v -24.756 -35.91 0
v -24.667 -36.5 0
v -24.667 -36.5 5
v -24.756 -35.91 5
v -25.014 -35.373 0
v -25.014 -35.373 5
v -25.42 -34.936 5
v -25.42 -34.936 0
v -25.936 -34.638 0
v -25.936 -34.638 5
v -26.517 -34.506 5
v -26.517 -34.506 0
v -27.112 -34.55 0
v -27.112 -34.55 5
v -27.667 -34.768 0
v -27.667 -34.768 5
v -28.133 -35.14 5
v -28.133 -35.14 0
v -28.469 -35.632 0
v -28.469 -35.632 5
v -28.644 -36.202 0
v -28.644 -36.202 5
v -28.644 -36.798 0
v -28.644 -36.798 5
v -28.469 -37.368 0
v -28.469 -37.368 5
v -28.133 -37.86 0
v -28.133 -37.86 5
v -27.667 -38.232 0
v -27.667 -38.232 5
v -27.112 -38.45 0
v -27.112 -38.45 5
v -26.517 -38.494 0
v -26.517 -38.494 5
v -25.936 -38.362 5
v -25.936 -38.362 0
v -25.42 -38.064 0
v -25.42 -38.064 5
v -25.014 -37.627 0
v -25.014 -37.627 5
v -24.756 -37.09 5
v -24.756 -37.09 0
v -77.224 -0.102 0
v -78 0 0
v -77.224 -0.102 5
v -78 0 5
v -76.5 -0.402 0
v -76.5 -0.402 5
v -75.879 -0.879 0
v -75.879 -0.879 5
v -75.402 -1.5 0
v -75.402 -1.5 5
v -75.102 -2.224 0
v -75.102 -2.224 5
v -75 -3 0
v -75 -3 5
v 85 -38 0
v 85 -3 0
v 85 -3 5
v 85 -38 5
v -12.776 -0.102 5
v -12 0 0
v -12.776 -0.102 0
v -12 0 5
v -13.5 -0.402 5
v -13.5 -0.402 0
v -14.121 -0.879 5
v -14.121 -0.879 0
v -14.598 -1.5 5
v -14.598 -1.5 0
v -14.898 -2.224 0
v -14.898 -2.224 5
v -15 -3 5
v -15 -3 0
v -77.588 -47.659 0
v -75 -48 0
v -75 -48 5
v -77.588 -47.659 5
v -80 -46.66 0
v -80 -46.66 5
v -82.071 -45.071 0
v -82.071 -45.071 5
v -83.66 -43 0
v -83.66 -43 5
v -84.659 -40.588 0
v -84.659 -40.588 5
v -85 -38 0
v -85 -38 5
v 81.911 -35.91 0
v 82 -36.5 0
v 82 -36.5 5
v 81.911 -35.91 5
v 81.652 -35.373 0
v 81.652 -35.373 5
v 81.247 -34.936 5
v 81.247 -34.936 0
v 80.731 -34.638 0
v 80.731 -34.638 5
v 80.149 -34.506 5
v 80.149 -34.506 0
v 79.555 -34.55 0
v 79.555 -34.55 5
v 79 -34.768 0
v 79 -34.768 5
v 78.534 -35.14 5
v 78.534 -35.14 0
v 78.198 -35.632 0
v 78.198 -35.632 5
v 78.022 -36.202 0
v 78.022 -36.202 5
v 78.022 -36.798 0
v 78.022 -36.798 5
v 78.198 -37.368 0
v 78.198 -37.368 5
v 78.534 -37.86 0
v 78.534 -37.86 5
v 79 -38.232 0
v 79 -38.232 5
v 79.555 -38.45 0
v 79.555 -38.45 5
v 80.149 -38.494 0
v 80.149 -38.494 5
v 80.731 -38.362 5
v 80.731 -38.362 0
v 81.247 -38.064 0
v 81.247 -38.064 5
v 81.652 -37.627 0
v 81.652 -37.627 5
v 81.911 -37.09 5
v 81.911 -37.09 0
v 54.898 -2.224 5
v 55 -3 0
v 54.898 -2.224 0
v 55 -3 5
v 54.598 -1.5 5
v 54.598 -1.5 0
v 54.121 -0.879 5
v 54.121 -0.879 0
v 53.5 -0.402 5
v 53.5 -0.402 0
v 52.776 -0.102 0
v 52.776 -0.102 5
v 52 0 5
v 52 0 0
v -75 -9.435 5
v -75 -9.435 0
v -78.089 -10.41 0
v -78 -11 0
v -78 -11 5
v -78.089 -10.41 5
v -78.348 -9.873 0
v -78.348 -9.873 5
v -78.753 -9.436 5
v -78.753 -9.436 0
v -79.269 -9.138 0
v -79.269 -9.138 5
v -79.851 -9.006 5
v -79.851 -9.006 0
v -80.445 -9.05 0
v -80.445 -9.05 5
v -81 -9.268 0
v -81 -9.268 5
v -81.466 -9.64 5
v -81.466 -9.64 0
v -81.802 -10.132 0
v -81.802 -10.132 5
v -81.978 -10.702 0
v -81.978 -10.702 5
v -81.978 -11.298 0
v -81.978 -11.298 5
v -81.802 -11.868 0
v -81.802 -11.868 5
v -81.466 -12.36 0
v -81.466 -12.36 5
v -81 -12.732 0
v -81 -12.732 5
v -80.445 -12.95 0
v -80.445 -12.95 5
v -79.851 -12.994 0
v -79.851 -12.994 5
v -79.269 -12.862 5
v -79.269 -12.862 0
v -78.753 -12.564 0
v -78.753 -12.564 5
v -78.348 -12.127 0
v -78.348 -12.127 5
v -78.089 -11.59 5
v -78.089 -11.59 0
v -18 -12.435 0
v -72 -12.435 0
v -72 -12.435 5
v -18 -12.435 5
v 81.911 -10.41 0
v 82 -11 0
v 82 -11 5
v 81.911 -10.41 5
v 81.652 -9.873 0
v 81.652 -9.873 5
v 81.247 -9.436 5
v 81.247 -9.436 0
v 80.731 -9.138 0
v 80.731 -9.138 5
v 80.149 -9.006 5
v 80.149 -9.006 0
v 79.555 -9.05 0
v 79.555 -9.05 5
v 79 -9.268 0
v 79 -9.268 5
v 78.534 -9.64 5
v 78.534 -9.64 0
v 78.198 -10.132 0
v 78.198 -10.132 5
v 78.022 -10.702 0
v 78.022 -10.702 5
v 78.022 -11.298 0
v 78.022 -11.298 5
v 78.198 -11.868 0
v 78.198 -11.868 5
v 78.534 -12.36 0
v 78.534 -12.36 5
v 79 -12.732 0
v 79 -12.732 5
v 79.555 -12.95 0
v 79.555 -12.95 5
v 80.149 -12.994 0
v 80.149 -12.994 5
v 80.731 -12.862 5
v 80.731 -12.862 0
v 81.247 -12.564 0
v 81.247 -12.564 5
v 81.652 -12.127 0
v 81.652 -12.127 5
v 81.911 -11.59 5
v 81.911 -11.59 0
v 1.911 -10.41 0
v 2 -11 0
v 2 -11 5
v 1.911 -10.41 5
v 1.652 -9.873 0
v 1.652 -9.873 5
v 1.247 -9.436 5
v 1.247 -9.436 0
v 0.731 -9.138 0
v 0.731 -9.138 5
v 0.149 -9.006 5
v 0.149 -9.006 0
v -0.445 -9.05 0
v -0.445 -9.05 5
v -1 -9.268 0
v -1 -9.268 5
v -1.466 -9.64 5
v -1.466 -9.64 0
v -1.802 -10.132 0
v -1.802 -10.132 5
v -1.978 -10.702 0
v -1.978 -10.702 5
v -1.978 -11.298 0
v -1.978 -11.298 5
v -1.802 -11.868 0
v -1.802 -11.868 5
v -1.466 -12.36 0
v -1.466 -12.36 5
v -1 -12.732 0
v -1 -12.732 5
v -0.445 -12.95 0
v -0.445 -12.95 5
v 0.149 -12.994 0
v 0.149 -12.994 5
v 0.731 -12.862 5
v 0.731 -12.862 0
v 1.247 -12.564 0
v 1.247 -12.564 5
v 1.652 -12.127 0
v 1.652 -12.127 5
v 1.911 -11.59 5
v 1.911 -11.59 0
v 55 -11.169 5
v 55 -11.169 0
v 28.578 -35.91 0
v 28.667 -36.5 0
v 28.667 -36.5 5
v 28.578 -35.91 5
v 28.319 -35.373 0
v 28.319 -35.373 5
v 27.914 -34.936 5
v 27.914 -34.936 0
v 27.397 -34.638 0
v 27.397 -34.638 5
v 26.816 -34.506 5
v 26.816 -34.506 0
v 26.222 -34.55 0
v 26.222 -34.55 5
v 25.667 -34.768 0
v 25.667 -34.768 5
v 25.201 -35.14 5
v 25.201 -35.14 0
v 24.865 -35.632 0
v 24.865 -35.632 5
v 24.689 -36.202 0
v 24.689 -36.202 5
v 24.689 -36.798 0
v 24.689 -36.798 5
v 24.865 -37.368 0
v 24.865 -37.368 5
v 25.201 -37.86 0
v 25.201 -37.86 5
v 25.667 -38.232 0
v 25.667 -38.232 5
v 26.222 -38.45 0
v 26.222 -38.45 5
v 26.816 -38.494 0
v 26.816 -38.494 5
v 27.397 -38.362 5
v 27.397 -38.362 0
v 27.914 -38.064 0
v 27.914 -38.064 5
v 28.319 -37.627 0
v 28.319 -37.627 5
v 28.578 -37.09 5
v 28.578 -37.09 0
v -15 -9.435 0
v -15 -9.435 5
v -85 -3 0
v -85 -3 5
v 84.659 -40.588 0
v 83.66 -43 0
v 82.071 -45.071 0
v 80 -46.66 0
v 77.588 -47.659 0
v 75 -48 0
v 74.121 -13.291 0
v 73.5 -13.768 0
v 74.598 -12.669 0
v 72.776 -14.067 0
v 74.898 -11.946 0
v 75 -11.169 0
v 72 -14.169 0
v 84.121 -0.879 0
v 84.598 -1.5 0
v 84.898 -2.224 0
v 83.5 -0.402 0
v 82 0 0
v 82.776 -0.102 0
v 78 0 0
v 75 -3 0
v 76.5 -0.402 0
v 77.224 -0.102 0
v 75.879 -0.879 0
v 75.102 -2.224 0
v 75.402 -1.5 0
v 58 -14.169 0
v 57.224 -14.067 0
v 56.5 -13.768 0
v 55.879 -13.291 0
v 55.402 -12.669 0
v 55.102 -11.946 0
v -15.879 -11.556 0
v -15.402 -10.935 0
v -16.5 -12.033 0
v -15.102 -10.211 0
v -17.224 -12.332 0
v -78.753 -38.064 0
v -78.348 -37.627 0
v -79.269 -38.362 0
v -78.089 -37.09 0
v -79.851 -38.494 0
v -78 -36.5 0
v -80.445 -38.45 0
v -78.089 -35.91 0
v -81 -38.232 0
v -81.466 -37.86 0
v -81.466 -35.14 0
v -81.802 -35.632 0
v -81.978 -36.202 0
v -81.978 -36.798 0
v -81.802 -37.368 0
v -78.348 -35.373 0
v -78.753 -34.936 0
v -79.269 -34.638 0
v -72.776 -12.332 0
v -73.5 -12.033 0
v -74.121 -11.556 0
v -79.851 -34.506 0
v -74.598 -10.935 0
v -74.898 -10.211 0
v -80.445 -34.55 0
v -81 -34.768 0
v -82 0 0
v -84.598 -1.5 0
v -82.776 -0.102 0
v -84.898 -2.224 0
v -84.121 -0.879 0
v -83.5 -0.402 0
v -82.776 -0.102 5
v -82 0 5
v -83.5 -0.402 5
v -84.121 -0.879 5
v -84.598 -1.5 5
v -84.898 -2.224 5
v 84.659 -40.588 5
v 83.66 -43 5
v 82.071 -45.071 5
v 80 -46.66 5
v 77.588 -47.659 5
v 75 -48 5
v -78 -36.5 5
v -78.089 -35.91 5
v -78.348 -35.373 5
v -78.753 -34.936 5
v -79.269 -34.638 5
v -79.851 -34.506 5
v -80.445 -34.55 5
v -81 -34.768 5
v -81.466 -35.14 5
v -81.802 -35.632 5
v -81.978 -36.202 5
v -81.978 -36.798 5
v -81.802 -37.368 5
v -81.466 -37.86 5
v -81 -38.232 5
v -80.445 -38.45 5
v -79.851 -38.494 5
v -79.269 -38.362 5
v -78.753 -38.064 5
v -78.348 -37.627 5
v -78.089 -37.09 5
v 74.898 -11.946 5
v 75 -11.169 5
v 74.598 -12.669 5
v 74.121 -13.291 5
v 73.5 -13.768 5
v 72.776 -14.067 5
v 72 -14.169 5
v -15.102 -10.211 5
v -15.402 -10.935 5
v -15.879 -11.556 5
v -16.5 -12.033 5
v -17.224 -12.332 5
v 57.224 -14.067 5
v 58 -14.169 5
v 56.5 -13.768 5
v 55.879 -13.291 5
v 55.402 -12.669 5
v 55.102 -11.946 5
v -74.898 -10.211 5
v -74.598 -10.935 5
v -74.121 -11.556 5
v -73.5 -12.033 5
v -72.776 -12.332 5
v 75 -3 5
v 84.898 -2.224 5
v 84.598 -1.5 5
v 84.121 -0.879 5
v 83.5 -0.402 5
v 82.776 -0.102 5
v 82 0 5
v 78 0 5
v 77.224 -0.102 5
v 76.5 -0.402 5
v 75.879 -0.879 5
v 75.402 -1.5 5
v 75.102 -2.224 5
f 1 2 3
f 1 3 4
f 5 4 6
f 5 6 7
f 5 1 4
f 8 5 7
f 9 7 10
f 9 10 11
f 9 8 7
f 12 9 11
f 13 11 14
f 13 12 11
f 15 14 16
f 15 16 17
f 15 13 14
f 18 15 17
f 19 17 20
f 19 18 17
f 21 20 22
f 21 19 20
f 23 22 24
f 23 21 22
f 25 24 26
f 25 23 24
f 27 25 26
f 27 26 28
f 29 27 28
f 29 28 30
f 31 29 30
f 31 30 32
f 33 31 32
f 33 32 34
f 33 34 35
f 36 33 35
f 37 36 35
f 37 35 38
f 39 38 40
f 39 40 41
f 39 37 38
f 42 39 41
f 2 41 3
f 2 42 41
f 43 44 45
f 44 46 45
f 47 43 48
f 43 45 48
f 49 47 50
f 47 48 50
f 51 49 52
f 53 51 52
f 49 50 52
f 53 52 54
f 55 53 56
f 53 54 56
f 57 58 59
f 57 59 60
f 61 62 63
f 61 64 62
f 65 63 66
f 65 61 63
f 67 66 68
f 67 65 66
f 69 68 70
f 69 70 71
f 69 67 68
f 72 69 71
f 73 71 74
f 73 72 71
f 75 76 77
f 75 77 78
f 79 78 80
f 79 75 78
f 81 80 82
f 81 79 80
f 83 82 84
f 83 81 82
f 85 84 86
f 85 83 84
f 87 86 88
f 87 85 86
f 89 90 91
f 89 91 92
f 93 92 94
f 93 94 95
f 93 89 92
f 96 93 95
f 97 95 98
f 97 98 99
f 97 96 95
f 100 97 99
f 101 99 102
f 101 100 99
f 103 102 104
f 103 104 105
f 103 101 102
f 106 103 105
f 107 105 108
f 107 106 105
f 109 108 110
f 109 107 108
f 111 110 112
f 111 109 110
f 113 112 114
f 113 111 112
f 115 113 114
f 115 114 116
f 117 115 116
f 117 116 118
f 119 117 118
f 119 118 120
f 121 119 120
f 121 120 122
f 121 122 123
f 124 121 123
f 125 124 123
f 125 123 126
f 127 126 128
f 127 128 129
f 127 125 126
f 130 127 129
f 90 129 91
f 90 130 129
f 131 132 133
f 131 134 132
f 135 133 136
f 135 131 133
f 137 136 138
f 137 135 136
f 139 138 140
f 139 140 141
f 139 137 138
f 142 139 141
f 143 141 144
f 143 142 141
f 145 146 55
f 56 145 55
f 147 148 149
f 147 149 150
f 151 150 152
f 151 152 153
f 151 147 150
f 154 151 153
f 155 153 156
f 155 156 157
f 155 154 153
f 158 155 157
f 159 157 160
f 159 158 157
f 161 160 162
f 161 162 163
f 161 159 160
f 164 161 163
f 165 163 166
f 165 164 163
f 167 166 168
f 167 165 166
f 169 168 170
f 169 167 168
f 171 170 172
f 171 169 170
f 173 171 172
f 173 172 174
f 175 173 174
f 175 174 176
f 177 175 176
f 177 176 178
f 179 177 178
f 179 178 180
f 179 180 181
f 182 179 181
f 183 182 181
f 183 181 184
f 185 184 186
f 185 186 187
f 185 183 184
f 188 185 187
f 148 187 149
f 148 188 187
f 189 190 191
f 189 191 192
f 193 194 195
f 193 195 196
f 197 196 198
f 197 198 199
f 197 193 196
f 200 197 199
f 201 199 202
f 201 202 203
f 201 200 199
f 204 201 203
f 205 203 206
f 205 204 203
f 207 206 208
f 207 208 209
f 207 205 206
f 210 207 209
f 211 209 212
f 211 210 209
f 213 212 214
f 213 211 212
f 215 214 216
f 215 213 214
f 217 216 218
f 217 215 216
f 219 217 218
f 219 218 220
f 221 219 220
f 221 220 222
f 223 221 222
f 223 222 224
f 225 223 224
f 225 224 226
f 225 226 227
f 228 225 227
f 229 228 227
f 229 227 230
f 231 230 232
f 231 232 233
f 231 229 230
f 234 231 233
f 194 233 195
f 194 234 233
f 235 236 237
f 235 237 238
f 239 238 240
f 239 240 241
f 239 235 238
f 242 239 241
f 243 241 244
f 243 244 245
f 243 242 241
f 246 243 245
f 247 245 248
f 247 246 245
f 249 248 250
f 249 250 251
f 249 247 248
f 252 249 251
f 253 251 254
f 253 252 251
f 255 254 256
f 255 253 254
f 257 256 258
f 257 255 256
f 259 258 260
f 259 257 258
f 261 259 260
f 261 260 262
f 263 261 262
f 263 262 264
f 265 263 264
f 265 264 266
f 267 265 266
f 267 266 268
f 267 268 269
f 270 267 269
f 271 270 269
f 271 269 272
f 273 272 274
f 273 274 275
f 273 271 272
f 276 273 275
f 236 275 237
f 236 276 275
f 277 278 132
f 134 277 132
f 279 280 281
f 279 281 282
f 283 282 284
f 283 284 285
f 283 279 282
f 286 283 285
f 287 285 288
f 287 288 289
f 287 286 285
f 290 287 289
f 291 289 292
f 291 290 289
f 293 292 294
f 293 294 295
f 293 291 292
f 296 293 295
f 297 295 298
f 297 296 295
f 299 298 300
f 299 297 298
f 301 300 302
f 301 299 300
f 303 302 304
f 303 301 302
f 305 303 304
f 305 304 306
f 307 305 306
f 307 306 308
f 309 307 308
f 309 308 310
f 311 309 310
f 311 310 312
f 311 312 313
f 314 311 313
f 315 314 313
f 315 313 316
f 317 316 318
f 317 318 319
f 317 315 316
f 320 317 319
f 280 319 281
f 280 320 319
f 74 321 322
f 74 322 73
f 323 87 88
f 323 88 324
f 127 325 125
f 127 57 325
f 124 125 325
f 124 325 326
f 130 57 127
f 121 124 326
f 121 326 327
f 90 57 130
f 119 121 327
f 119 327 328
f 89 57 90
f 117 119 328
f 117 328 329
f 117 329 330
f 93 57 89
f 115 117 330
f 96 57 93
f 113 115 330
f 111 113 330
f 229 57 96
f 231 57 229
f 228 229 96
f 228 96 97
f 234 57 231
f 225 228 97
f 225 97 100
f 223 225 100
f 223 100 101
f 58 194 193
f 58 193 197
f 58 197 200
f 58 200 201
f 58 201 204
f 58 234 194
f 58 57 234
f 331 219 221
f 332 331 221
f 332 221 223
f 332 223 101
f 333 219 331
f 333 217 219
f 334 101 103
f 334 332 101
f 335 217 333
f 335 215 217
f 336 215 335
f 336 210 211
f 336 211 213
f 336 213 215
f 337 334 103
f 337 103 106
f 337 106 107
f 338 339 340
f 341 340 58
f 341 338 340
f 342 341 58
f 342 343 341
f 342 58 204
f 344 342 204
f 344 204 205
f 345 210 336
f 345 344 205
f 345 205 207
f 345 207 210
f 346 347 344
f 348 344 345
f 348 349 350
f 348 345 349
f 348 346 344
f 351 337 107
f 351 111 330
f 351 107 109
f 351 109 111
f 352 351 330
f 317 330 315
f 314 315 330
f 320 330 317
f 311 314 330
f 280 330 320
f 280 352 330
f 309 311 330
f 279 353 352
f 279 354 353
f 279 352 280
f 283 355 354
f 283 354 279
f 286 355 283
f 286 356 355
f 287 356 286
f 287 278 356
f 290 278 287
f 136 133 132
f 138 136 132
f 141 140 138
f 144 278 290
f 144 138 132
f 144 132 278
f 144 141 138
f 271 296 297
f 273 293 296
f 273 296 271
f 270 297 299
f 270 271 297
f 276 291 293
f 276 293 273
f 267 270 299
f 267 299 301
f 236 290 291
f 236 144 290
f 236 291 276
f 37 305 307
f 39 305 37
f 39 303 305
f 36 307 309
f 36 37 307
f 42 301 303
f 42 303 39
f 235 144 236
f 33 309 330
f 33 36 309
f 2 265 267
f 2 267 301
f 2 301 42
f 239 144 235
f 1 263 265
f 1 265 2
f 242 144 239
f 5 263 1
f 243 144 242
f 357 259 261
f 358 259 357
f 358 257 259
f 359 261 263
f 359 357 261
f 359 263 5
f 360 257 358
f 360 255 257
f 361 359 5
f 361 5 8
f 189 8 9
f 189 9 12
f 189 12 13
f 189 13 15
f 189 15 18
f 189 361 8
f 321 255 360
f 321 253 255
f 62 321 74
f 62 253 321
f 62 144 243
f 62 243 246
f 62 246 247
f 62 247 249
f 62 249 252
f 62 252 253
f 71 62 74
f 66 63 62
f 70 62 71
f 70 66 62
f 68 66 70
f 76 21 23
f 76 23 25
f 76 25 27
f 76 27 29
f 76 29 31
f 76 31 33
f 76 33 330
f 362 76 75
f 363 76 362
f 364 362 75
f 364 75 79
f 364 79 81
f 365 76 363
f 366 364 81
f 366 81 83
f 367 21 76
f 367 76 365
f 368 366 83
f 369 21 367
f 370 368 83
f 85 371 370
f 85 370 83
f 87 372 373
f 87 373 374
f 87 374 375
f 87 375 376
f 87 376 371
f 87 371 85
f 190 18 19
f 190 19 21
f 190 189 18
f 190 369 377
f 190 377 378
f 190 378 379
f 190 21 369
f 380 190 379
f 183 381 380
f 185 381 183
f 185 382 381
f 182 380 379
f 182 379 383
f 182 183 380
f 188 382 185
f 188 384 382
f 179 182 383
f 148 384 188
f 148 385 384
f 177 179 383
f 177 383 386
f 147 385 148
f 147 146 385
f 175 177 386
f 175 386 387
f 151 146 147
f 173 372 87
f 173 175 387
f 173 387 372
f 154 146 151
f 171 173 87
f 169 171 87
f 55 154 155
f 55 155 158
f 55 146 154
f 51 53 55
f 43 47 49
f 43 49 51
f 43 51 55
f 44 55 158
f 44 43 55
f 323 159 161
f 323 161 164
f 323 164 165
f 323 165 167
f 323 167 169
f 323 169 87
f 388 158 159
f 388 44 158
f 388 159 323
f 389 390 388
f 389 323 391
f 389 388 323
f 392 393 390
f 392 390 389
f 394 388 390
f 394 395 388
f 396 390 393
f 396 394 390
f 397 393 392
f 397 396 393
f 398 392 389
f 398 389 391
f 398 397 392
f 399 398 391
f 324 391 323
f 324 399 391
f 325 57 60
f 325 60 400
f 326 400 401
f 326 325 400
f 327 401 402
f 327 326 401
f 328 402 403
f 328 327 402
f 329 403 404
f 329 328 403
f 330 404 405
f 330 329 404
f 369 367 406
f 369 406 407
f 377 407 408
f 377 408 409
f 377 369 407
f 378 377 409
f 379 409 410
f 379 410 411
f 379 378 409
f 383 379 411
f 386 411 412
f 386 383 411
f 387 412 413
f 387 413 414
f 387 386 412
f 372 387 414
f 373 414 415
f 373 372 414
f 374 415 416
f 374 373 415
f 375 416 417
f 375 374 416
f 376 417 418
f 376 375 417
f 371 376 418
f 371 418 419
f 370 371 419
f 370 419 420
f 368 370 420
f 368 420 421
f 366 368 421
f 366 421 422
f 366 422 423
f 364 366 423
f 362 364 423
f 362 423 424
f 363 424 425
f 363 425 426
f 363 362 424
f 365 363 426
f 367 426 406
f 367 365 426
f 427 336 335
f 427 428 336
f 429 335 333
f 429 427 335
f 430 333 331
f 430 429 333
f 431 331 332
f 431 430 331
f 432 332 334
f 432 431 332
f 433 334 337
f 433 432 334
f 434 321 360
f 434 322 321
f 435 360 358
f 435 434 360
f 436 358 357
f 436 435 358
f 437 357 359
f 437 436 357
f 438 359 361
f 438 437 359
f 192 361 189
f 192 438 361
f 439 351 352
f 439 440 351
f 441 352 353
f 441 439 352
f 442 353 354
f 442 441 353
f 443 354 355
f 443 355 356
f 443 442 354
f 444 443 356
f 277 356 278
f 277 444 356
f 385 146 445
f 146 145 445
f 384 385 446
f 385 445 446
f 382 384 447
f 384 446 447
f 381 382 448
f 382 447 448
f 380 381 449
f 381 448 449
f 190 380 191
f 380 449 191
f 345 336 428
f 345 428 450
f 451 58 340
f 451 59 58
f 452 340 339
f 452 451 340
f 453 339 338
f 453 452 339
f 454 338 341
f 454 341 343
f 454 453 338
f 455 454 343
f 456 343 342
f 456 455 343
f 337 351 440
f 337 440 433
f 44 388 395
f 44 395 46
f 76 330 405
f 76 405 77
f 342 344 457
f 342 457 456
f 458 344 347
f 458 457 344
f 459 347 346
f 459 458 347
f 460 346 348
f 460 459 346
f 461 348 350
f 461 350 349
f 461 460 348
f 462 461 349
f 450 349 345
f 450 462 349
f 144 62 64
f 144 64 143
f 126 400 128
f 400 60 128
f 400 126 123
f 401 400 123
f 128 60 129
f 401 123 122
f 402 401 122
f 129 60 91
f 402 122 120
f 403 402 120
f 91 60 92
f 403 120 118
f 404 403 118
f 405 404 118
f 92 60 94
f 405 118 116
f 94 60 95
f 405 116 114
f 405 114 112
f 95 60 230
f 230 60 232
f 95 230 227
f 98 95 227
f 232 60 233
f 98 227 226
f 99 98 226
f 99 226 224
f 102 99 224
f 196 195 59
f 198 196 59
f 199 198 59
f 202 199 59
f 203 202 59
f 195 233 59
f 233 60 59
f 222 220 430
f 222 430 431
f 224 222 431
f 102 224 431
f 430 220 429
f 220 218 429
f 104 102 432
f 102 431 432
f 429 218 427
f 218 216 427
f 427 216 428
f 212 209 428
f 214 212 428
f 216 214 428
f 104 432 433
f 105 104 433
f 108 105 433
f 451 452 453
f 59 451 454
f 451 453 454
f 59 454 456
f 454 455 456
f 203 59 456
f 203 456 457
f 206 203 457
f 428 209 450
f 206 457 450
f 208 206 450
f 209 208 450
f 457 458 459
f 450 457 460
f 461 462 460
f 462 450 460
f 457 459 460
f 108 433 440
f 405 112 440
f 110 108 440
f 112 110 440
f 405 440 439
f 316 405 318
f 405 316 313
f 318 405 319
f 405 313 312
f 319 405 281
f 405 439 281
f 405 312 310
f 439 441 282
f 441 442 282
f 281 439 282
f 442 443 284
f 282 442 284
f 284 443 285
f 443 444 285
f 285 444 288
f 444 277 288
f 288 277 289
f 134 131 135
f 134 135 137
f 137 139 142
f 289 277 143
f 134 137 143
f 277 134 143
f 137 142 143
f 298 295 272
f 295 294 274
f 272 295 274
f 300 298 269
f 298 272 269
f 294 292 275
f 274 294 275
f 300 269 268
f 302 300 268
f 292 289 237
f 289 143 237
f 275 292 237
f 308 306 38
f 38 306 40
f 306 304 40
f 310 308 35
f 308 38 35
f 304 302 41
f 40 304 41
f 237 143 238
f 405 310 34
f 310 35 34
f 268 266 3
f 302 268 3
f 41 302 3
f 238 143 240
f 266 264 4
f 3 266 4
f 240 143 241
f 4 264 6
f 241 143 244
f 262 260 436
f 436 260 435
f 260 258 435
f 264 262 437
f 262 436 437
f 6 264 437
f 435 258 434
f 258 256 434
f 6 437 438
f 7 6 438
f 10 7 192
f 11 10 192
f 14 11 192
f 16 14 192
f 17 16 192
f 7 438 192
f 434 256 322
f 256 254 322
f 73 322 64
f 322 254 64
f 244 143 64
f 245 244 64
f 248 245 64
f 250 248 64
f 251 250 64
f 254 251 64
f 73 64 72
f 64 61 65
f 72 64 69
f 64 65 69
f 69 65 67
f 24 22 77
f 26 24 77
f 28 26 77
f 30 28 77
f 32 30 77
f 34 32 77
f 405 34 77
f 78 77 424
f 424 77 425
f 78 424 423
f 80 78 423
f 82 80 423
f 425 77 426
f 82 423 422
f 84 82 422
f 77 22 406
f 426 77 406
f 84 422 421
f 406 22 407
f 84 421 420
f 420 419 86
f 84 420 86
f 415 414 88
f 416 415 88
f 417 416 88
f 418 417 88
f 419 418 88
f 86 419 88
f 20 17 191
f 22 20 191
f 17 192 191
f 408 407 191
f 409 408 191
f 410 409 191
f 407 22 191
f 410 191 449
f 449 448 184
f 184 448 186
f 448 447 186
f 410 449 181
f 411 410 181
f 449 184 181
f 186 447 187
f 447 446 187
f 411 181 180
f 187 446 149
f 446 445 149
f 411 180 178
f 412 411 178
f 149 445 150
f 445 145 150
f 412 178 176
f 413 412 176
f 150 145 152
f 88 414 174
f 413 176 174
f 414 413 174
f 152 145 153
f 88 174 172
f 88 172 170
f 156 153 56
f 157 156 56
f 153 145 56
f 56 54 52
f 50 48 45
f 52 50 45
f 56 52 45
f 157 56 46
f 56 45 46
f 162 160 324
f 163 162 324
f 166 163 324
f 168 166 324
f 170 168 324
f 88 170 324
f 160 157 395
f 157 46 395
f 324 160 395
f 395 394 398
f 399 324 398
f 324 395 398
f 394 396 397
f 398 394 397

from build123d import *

# Parameters (mm, degrees)
SKETCH_1_R          = 2
EXTRUDE_1_DEPTH     = 5
SKETCH_2_W          = 60
SKETCH_2_H          = 24.578099901
SKETCH_2_W_2        = 20
SKETCH_2_H_2        = 18.209440524
CUT_EXTRUDE_1_DEPTH = 29
FILLET_1_R          = 3


with BuildPart() as part:
    # 草图1 → 凸台-拉伸1 (new body)
    with BuildSketch(Plane.XY):
        with BuildLine():
            Line((-85, 0), (85, 0))
            Line((85, 0), (85, -38))
            ThreePointArc((85, -38), (82.071067812, -45.071067812), (75, -48))
            Line((75, -48), (-75, -48))
            ThreePointArc((-75, -48), (-82.071067812, -45.071067812), (-85, -38))
            Line((-85, -38), (-85, 0))
        make_face()
        with Locations((-80, -11)):
            Circle(SKETCH_1_R, mode=Mode.SUBTRACT)
        with Locations((0, -11)):
            Circle(SKETCH_1_R, mode=Mode.SUBTRACT)
        with Locations((80, -11)):
            Circle(SKETCH_1_R, mode=Mode.SUBTRACT)
        with Locations((-80, -36.5)):
            Circle(SKETCH_1_R, mode=Mode.SUBTRACT)
        with Locations((80, -36.5)):
            Circle(SKETCH_1_R, mode=Mode.SUBTRACT)
        with Locations((-26.666666667, -36.5)):
            Circle(SKETCH_1_R, mode=Mode.SUBTRACT)
        with Locations((26.666666667, -36.5)):
            Circle(SKETCH_1_R, mode=Mode.SUBTRACT)
    extrude(amount=EXTRUDE_1_DEPTH)

    # 草图2 → 切除-拉伸1 (cut)
    with BuildSketch(Plane.XY):
        with Locations((-45, -0.145574748)):
            Rectangle(SKETCH_2_W, SKETCH_2_H)
        with Locations((65, -5.064712671)):
            Rectangle(SKETCH_2_W_2, SKETCH_2_H_2)
    extrude(amount=CUT_EXTRUDE_1_DEPTH, mode=Mode.SUBTRACT)

    # 圆角1
    fillet_1_edges = [part.edges().sort_by_distance(p)[0] for p in [
        (-85, 0, 2.5),
        (85, 0, 2.5),
        (55, 0, 2.5),
        (75, 0, 2.5),
        (-75, 0, 2.5),
        (-15, 0, 2.5),
        (-75, -12.434624699, 2.5),
        (-15, -12.434624699, 2.5),
        (55, -14.169432933, 2.5),
        (75, -14.169432933, 2.5),
    ]]
    fillet(fillet_1_edges, radius=FILLET_1_R)


solid = part.part
